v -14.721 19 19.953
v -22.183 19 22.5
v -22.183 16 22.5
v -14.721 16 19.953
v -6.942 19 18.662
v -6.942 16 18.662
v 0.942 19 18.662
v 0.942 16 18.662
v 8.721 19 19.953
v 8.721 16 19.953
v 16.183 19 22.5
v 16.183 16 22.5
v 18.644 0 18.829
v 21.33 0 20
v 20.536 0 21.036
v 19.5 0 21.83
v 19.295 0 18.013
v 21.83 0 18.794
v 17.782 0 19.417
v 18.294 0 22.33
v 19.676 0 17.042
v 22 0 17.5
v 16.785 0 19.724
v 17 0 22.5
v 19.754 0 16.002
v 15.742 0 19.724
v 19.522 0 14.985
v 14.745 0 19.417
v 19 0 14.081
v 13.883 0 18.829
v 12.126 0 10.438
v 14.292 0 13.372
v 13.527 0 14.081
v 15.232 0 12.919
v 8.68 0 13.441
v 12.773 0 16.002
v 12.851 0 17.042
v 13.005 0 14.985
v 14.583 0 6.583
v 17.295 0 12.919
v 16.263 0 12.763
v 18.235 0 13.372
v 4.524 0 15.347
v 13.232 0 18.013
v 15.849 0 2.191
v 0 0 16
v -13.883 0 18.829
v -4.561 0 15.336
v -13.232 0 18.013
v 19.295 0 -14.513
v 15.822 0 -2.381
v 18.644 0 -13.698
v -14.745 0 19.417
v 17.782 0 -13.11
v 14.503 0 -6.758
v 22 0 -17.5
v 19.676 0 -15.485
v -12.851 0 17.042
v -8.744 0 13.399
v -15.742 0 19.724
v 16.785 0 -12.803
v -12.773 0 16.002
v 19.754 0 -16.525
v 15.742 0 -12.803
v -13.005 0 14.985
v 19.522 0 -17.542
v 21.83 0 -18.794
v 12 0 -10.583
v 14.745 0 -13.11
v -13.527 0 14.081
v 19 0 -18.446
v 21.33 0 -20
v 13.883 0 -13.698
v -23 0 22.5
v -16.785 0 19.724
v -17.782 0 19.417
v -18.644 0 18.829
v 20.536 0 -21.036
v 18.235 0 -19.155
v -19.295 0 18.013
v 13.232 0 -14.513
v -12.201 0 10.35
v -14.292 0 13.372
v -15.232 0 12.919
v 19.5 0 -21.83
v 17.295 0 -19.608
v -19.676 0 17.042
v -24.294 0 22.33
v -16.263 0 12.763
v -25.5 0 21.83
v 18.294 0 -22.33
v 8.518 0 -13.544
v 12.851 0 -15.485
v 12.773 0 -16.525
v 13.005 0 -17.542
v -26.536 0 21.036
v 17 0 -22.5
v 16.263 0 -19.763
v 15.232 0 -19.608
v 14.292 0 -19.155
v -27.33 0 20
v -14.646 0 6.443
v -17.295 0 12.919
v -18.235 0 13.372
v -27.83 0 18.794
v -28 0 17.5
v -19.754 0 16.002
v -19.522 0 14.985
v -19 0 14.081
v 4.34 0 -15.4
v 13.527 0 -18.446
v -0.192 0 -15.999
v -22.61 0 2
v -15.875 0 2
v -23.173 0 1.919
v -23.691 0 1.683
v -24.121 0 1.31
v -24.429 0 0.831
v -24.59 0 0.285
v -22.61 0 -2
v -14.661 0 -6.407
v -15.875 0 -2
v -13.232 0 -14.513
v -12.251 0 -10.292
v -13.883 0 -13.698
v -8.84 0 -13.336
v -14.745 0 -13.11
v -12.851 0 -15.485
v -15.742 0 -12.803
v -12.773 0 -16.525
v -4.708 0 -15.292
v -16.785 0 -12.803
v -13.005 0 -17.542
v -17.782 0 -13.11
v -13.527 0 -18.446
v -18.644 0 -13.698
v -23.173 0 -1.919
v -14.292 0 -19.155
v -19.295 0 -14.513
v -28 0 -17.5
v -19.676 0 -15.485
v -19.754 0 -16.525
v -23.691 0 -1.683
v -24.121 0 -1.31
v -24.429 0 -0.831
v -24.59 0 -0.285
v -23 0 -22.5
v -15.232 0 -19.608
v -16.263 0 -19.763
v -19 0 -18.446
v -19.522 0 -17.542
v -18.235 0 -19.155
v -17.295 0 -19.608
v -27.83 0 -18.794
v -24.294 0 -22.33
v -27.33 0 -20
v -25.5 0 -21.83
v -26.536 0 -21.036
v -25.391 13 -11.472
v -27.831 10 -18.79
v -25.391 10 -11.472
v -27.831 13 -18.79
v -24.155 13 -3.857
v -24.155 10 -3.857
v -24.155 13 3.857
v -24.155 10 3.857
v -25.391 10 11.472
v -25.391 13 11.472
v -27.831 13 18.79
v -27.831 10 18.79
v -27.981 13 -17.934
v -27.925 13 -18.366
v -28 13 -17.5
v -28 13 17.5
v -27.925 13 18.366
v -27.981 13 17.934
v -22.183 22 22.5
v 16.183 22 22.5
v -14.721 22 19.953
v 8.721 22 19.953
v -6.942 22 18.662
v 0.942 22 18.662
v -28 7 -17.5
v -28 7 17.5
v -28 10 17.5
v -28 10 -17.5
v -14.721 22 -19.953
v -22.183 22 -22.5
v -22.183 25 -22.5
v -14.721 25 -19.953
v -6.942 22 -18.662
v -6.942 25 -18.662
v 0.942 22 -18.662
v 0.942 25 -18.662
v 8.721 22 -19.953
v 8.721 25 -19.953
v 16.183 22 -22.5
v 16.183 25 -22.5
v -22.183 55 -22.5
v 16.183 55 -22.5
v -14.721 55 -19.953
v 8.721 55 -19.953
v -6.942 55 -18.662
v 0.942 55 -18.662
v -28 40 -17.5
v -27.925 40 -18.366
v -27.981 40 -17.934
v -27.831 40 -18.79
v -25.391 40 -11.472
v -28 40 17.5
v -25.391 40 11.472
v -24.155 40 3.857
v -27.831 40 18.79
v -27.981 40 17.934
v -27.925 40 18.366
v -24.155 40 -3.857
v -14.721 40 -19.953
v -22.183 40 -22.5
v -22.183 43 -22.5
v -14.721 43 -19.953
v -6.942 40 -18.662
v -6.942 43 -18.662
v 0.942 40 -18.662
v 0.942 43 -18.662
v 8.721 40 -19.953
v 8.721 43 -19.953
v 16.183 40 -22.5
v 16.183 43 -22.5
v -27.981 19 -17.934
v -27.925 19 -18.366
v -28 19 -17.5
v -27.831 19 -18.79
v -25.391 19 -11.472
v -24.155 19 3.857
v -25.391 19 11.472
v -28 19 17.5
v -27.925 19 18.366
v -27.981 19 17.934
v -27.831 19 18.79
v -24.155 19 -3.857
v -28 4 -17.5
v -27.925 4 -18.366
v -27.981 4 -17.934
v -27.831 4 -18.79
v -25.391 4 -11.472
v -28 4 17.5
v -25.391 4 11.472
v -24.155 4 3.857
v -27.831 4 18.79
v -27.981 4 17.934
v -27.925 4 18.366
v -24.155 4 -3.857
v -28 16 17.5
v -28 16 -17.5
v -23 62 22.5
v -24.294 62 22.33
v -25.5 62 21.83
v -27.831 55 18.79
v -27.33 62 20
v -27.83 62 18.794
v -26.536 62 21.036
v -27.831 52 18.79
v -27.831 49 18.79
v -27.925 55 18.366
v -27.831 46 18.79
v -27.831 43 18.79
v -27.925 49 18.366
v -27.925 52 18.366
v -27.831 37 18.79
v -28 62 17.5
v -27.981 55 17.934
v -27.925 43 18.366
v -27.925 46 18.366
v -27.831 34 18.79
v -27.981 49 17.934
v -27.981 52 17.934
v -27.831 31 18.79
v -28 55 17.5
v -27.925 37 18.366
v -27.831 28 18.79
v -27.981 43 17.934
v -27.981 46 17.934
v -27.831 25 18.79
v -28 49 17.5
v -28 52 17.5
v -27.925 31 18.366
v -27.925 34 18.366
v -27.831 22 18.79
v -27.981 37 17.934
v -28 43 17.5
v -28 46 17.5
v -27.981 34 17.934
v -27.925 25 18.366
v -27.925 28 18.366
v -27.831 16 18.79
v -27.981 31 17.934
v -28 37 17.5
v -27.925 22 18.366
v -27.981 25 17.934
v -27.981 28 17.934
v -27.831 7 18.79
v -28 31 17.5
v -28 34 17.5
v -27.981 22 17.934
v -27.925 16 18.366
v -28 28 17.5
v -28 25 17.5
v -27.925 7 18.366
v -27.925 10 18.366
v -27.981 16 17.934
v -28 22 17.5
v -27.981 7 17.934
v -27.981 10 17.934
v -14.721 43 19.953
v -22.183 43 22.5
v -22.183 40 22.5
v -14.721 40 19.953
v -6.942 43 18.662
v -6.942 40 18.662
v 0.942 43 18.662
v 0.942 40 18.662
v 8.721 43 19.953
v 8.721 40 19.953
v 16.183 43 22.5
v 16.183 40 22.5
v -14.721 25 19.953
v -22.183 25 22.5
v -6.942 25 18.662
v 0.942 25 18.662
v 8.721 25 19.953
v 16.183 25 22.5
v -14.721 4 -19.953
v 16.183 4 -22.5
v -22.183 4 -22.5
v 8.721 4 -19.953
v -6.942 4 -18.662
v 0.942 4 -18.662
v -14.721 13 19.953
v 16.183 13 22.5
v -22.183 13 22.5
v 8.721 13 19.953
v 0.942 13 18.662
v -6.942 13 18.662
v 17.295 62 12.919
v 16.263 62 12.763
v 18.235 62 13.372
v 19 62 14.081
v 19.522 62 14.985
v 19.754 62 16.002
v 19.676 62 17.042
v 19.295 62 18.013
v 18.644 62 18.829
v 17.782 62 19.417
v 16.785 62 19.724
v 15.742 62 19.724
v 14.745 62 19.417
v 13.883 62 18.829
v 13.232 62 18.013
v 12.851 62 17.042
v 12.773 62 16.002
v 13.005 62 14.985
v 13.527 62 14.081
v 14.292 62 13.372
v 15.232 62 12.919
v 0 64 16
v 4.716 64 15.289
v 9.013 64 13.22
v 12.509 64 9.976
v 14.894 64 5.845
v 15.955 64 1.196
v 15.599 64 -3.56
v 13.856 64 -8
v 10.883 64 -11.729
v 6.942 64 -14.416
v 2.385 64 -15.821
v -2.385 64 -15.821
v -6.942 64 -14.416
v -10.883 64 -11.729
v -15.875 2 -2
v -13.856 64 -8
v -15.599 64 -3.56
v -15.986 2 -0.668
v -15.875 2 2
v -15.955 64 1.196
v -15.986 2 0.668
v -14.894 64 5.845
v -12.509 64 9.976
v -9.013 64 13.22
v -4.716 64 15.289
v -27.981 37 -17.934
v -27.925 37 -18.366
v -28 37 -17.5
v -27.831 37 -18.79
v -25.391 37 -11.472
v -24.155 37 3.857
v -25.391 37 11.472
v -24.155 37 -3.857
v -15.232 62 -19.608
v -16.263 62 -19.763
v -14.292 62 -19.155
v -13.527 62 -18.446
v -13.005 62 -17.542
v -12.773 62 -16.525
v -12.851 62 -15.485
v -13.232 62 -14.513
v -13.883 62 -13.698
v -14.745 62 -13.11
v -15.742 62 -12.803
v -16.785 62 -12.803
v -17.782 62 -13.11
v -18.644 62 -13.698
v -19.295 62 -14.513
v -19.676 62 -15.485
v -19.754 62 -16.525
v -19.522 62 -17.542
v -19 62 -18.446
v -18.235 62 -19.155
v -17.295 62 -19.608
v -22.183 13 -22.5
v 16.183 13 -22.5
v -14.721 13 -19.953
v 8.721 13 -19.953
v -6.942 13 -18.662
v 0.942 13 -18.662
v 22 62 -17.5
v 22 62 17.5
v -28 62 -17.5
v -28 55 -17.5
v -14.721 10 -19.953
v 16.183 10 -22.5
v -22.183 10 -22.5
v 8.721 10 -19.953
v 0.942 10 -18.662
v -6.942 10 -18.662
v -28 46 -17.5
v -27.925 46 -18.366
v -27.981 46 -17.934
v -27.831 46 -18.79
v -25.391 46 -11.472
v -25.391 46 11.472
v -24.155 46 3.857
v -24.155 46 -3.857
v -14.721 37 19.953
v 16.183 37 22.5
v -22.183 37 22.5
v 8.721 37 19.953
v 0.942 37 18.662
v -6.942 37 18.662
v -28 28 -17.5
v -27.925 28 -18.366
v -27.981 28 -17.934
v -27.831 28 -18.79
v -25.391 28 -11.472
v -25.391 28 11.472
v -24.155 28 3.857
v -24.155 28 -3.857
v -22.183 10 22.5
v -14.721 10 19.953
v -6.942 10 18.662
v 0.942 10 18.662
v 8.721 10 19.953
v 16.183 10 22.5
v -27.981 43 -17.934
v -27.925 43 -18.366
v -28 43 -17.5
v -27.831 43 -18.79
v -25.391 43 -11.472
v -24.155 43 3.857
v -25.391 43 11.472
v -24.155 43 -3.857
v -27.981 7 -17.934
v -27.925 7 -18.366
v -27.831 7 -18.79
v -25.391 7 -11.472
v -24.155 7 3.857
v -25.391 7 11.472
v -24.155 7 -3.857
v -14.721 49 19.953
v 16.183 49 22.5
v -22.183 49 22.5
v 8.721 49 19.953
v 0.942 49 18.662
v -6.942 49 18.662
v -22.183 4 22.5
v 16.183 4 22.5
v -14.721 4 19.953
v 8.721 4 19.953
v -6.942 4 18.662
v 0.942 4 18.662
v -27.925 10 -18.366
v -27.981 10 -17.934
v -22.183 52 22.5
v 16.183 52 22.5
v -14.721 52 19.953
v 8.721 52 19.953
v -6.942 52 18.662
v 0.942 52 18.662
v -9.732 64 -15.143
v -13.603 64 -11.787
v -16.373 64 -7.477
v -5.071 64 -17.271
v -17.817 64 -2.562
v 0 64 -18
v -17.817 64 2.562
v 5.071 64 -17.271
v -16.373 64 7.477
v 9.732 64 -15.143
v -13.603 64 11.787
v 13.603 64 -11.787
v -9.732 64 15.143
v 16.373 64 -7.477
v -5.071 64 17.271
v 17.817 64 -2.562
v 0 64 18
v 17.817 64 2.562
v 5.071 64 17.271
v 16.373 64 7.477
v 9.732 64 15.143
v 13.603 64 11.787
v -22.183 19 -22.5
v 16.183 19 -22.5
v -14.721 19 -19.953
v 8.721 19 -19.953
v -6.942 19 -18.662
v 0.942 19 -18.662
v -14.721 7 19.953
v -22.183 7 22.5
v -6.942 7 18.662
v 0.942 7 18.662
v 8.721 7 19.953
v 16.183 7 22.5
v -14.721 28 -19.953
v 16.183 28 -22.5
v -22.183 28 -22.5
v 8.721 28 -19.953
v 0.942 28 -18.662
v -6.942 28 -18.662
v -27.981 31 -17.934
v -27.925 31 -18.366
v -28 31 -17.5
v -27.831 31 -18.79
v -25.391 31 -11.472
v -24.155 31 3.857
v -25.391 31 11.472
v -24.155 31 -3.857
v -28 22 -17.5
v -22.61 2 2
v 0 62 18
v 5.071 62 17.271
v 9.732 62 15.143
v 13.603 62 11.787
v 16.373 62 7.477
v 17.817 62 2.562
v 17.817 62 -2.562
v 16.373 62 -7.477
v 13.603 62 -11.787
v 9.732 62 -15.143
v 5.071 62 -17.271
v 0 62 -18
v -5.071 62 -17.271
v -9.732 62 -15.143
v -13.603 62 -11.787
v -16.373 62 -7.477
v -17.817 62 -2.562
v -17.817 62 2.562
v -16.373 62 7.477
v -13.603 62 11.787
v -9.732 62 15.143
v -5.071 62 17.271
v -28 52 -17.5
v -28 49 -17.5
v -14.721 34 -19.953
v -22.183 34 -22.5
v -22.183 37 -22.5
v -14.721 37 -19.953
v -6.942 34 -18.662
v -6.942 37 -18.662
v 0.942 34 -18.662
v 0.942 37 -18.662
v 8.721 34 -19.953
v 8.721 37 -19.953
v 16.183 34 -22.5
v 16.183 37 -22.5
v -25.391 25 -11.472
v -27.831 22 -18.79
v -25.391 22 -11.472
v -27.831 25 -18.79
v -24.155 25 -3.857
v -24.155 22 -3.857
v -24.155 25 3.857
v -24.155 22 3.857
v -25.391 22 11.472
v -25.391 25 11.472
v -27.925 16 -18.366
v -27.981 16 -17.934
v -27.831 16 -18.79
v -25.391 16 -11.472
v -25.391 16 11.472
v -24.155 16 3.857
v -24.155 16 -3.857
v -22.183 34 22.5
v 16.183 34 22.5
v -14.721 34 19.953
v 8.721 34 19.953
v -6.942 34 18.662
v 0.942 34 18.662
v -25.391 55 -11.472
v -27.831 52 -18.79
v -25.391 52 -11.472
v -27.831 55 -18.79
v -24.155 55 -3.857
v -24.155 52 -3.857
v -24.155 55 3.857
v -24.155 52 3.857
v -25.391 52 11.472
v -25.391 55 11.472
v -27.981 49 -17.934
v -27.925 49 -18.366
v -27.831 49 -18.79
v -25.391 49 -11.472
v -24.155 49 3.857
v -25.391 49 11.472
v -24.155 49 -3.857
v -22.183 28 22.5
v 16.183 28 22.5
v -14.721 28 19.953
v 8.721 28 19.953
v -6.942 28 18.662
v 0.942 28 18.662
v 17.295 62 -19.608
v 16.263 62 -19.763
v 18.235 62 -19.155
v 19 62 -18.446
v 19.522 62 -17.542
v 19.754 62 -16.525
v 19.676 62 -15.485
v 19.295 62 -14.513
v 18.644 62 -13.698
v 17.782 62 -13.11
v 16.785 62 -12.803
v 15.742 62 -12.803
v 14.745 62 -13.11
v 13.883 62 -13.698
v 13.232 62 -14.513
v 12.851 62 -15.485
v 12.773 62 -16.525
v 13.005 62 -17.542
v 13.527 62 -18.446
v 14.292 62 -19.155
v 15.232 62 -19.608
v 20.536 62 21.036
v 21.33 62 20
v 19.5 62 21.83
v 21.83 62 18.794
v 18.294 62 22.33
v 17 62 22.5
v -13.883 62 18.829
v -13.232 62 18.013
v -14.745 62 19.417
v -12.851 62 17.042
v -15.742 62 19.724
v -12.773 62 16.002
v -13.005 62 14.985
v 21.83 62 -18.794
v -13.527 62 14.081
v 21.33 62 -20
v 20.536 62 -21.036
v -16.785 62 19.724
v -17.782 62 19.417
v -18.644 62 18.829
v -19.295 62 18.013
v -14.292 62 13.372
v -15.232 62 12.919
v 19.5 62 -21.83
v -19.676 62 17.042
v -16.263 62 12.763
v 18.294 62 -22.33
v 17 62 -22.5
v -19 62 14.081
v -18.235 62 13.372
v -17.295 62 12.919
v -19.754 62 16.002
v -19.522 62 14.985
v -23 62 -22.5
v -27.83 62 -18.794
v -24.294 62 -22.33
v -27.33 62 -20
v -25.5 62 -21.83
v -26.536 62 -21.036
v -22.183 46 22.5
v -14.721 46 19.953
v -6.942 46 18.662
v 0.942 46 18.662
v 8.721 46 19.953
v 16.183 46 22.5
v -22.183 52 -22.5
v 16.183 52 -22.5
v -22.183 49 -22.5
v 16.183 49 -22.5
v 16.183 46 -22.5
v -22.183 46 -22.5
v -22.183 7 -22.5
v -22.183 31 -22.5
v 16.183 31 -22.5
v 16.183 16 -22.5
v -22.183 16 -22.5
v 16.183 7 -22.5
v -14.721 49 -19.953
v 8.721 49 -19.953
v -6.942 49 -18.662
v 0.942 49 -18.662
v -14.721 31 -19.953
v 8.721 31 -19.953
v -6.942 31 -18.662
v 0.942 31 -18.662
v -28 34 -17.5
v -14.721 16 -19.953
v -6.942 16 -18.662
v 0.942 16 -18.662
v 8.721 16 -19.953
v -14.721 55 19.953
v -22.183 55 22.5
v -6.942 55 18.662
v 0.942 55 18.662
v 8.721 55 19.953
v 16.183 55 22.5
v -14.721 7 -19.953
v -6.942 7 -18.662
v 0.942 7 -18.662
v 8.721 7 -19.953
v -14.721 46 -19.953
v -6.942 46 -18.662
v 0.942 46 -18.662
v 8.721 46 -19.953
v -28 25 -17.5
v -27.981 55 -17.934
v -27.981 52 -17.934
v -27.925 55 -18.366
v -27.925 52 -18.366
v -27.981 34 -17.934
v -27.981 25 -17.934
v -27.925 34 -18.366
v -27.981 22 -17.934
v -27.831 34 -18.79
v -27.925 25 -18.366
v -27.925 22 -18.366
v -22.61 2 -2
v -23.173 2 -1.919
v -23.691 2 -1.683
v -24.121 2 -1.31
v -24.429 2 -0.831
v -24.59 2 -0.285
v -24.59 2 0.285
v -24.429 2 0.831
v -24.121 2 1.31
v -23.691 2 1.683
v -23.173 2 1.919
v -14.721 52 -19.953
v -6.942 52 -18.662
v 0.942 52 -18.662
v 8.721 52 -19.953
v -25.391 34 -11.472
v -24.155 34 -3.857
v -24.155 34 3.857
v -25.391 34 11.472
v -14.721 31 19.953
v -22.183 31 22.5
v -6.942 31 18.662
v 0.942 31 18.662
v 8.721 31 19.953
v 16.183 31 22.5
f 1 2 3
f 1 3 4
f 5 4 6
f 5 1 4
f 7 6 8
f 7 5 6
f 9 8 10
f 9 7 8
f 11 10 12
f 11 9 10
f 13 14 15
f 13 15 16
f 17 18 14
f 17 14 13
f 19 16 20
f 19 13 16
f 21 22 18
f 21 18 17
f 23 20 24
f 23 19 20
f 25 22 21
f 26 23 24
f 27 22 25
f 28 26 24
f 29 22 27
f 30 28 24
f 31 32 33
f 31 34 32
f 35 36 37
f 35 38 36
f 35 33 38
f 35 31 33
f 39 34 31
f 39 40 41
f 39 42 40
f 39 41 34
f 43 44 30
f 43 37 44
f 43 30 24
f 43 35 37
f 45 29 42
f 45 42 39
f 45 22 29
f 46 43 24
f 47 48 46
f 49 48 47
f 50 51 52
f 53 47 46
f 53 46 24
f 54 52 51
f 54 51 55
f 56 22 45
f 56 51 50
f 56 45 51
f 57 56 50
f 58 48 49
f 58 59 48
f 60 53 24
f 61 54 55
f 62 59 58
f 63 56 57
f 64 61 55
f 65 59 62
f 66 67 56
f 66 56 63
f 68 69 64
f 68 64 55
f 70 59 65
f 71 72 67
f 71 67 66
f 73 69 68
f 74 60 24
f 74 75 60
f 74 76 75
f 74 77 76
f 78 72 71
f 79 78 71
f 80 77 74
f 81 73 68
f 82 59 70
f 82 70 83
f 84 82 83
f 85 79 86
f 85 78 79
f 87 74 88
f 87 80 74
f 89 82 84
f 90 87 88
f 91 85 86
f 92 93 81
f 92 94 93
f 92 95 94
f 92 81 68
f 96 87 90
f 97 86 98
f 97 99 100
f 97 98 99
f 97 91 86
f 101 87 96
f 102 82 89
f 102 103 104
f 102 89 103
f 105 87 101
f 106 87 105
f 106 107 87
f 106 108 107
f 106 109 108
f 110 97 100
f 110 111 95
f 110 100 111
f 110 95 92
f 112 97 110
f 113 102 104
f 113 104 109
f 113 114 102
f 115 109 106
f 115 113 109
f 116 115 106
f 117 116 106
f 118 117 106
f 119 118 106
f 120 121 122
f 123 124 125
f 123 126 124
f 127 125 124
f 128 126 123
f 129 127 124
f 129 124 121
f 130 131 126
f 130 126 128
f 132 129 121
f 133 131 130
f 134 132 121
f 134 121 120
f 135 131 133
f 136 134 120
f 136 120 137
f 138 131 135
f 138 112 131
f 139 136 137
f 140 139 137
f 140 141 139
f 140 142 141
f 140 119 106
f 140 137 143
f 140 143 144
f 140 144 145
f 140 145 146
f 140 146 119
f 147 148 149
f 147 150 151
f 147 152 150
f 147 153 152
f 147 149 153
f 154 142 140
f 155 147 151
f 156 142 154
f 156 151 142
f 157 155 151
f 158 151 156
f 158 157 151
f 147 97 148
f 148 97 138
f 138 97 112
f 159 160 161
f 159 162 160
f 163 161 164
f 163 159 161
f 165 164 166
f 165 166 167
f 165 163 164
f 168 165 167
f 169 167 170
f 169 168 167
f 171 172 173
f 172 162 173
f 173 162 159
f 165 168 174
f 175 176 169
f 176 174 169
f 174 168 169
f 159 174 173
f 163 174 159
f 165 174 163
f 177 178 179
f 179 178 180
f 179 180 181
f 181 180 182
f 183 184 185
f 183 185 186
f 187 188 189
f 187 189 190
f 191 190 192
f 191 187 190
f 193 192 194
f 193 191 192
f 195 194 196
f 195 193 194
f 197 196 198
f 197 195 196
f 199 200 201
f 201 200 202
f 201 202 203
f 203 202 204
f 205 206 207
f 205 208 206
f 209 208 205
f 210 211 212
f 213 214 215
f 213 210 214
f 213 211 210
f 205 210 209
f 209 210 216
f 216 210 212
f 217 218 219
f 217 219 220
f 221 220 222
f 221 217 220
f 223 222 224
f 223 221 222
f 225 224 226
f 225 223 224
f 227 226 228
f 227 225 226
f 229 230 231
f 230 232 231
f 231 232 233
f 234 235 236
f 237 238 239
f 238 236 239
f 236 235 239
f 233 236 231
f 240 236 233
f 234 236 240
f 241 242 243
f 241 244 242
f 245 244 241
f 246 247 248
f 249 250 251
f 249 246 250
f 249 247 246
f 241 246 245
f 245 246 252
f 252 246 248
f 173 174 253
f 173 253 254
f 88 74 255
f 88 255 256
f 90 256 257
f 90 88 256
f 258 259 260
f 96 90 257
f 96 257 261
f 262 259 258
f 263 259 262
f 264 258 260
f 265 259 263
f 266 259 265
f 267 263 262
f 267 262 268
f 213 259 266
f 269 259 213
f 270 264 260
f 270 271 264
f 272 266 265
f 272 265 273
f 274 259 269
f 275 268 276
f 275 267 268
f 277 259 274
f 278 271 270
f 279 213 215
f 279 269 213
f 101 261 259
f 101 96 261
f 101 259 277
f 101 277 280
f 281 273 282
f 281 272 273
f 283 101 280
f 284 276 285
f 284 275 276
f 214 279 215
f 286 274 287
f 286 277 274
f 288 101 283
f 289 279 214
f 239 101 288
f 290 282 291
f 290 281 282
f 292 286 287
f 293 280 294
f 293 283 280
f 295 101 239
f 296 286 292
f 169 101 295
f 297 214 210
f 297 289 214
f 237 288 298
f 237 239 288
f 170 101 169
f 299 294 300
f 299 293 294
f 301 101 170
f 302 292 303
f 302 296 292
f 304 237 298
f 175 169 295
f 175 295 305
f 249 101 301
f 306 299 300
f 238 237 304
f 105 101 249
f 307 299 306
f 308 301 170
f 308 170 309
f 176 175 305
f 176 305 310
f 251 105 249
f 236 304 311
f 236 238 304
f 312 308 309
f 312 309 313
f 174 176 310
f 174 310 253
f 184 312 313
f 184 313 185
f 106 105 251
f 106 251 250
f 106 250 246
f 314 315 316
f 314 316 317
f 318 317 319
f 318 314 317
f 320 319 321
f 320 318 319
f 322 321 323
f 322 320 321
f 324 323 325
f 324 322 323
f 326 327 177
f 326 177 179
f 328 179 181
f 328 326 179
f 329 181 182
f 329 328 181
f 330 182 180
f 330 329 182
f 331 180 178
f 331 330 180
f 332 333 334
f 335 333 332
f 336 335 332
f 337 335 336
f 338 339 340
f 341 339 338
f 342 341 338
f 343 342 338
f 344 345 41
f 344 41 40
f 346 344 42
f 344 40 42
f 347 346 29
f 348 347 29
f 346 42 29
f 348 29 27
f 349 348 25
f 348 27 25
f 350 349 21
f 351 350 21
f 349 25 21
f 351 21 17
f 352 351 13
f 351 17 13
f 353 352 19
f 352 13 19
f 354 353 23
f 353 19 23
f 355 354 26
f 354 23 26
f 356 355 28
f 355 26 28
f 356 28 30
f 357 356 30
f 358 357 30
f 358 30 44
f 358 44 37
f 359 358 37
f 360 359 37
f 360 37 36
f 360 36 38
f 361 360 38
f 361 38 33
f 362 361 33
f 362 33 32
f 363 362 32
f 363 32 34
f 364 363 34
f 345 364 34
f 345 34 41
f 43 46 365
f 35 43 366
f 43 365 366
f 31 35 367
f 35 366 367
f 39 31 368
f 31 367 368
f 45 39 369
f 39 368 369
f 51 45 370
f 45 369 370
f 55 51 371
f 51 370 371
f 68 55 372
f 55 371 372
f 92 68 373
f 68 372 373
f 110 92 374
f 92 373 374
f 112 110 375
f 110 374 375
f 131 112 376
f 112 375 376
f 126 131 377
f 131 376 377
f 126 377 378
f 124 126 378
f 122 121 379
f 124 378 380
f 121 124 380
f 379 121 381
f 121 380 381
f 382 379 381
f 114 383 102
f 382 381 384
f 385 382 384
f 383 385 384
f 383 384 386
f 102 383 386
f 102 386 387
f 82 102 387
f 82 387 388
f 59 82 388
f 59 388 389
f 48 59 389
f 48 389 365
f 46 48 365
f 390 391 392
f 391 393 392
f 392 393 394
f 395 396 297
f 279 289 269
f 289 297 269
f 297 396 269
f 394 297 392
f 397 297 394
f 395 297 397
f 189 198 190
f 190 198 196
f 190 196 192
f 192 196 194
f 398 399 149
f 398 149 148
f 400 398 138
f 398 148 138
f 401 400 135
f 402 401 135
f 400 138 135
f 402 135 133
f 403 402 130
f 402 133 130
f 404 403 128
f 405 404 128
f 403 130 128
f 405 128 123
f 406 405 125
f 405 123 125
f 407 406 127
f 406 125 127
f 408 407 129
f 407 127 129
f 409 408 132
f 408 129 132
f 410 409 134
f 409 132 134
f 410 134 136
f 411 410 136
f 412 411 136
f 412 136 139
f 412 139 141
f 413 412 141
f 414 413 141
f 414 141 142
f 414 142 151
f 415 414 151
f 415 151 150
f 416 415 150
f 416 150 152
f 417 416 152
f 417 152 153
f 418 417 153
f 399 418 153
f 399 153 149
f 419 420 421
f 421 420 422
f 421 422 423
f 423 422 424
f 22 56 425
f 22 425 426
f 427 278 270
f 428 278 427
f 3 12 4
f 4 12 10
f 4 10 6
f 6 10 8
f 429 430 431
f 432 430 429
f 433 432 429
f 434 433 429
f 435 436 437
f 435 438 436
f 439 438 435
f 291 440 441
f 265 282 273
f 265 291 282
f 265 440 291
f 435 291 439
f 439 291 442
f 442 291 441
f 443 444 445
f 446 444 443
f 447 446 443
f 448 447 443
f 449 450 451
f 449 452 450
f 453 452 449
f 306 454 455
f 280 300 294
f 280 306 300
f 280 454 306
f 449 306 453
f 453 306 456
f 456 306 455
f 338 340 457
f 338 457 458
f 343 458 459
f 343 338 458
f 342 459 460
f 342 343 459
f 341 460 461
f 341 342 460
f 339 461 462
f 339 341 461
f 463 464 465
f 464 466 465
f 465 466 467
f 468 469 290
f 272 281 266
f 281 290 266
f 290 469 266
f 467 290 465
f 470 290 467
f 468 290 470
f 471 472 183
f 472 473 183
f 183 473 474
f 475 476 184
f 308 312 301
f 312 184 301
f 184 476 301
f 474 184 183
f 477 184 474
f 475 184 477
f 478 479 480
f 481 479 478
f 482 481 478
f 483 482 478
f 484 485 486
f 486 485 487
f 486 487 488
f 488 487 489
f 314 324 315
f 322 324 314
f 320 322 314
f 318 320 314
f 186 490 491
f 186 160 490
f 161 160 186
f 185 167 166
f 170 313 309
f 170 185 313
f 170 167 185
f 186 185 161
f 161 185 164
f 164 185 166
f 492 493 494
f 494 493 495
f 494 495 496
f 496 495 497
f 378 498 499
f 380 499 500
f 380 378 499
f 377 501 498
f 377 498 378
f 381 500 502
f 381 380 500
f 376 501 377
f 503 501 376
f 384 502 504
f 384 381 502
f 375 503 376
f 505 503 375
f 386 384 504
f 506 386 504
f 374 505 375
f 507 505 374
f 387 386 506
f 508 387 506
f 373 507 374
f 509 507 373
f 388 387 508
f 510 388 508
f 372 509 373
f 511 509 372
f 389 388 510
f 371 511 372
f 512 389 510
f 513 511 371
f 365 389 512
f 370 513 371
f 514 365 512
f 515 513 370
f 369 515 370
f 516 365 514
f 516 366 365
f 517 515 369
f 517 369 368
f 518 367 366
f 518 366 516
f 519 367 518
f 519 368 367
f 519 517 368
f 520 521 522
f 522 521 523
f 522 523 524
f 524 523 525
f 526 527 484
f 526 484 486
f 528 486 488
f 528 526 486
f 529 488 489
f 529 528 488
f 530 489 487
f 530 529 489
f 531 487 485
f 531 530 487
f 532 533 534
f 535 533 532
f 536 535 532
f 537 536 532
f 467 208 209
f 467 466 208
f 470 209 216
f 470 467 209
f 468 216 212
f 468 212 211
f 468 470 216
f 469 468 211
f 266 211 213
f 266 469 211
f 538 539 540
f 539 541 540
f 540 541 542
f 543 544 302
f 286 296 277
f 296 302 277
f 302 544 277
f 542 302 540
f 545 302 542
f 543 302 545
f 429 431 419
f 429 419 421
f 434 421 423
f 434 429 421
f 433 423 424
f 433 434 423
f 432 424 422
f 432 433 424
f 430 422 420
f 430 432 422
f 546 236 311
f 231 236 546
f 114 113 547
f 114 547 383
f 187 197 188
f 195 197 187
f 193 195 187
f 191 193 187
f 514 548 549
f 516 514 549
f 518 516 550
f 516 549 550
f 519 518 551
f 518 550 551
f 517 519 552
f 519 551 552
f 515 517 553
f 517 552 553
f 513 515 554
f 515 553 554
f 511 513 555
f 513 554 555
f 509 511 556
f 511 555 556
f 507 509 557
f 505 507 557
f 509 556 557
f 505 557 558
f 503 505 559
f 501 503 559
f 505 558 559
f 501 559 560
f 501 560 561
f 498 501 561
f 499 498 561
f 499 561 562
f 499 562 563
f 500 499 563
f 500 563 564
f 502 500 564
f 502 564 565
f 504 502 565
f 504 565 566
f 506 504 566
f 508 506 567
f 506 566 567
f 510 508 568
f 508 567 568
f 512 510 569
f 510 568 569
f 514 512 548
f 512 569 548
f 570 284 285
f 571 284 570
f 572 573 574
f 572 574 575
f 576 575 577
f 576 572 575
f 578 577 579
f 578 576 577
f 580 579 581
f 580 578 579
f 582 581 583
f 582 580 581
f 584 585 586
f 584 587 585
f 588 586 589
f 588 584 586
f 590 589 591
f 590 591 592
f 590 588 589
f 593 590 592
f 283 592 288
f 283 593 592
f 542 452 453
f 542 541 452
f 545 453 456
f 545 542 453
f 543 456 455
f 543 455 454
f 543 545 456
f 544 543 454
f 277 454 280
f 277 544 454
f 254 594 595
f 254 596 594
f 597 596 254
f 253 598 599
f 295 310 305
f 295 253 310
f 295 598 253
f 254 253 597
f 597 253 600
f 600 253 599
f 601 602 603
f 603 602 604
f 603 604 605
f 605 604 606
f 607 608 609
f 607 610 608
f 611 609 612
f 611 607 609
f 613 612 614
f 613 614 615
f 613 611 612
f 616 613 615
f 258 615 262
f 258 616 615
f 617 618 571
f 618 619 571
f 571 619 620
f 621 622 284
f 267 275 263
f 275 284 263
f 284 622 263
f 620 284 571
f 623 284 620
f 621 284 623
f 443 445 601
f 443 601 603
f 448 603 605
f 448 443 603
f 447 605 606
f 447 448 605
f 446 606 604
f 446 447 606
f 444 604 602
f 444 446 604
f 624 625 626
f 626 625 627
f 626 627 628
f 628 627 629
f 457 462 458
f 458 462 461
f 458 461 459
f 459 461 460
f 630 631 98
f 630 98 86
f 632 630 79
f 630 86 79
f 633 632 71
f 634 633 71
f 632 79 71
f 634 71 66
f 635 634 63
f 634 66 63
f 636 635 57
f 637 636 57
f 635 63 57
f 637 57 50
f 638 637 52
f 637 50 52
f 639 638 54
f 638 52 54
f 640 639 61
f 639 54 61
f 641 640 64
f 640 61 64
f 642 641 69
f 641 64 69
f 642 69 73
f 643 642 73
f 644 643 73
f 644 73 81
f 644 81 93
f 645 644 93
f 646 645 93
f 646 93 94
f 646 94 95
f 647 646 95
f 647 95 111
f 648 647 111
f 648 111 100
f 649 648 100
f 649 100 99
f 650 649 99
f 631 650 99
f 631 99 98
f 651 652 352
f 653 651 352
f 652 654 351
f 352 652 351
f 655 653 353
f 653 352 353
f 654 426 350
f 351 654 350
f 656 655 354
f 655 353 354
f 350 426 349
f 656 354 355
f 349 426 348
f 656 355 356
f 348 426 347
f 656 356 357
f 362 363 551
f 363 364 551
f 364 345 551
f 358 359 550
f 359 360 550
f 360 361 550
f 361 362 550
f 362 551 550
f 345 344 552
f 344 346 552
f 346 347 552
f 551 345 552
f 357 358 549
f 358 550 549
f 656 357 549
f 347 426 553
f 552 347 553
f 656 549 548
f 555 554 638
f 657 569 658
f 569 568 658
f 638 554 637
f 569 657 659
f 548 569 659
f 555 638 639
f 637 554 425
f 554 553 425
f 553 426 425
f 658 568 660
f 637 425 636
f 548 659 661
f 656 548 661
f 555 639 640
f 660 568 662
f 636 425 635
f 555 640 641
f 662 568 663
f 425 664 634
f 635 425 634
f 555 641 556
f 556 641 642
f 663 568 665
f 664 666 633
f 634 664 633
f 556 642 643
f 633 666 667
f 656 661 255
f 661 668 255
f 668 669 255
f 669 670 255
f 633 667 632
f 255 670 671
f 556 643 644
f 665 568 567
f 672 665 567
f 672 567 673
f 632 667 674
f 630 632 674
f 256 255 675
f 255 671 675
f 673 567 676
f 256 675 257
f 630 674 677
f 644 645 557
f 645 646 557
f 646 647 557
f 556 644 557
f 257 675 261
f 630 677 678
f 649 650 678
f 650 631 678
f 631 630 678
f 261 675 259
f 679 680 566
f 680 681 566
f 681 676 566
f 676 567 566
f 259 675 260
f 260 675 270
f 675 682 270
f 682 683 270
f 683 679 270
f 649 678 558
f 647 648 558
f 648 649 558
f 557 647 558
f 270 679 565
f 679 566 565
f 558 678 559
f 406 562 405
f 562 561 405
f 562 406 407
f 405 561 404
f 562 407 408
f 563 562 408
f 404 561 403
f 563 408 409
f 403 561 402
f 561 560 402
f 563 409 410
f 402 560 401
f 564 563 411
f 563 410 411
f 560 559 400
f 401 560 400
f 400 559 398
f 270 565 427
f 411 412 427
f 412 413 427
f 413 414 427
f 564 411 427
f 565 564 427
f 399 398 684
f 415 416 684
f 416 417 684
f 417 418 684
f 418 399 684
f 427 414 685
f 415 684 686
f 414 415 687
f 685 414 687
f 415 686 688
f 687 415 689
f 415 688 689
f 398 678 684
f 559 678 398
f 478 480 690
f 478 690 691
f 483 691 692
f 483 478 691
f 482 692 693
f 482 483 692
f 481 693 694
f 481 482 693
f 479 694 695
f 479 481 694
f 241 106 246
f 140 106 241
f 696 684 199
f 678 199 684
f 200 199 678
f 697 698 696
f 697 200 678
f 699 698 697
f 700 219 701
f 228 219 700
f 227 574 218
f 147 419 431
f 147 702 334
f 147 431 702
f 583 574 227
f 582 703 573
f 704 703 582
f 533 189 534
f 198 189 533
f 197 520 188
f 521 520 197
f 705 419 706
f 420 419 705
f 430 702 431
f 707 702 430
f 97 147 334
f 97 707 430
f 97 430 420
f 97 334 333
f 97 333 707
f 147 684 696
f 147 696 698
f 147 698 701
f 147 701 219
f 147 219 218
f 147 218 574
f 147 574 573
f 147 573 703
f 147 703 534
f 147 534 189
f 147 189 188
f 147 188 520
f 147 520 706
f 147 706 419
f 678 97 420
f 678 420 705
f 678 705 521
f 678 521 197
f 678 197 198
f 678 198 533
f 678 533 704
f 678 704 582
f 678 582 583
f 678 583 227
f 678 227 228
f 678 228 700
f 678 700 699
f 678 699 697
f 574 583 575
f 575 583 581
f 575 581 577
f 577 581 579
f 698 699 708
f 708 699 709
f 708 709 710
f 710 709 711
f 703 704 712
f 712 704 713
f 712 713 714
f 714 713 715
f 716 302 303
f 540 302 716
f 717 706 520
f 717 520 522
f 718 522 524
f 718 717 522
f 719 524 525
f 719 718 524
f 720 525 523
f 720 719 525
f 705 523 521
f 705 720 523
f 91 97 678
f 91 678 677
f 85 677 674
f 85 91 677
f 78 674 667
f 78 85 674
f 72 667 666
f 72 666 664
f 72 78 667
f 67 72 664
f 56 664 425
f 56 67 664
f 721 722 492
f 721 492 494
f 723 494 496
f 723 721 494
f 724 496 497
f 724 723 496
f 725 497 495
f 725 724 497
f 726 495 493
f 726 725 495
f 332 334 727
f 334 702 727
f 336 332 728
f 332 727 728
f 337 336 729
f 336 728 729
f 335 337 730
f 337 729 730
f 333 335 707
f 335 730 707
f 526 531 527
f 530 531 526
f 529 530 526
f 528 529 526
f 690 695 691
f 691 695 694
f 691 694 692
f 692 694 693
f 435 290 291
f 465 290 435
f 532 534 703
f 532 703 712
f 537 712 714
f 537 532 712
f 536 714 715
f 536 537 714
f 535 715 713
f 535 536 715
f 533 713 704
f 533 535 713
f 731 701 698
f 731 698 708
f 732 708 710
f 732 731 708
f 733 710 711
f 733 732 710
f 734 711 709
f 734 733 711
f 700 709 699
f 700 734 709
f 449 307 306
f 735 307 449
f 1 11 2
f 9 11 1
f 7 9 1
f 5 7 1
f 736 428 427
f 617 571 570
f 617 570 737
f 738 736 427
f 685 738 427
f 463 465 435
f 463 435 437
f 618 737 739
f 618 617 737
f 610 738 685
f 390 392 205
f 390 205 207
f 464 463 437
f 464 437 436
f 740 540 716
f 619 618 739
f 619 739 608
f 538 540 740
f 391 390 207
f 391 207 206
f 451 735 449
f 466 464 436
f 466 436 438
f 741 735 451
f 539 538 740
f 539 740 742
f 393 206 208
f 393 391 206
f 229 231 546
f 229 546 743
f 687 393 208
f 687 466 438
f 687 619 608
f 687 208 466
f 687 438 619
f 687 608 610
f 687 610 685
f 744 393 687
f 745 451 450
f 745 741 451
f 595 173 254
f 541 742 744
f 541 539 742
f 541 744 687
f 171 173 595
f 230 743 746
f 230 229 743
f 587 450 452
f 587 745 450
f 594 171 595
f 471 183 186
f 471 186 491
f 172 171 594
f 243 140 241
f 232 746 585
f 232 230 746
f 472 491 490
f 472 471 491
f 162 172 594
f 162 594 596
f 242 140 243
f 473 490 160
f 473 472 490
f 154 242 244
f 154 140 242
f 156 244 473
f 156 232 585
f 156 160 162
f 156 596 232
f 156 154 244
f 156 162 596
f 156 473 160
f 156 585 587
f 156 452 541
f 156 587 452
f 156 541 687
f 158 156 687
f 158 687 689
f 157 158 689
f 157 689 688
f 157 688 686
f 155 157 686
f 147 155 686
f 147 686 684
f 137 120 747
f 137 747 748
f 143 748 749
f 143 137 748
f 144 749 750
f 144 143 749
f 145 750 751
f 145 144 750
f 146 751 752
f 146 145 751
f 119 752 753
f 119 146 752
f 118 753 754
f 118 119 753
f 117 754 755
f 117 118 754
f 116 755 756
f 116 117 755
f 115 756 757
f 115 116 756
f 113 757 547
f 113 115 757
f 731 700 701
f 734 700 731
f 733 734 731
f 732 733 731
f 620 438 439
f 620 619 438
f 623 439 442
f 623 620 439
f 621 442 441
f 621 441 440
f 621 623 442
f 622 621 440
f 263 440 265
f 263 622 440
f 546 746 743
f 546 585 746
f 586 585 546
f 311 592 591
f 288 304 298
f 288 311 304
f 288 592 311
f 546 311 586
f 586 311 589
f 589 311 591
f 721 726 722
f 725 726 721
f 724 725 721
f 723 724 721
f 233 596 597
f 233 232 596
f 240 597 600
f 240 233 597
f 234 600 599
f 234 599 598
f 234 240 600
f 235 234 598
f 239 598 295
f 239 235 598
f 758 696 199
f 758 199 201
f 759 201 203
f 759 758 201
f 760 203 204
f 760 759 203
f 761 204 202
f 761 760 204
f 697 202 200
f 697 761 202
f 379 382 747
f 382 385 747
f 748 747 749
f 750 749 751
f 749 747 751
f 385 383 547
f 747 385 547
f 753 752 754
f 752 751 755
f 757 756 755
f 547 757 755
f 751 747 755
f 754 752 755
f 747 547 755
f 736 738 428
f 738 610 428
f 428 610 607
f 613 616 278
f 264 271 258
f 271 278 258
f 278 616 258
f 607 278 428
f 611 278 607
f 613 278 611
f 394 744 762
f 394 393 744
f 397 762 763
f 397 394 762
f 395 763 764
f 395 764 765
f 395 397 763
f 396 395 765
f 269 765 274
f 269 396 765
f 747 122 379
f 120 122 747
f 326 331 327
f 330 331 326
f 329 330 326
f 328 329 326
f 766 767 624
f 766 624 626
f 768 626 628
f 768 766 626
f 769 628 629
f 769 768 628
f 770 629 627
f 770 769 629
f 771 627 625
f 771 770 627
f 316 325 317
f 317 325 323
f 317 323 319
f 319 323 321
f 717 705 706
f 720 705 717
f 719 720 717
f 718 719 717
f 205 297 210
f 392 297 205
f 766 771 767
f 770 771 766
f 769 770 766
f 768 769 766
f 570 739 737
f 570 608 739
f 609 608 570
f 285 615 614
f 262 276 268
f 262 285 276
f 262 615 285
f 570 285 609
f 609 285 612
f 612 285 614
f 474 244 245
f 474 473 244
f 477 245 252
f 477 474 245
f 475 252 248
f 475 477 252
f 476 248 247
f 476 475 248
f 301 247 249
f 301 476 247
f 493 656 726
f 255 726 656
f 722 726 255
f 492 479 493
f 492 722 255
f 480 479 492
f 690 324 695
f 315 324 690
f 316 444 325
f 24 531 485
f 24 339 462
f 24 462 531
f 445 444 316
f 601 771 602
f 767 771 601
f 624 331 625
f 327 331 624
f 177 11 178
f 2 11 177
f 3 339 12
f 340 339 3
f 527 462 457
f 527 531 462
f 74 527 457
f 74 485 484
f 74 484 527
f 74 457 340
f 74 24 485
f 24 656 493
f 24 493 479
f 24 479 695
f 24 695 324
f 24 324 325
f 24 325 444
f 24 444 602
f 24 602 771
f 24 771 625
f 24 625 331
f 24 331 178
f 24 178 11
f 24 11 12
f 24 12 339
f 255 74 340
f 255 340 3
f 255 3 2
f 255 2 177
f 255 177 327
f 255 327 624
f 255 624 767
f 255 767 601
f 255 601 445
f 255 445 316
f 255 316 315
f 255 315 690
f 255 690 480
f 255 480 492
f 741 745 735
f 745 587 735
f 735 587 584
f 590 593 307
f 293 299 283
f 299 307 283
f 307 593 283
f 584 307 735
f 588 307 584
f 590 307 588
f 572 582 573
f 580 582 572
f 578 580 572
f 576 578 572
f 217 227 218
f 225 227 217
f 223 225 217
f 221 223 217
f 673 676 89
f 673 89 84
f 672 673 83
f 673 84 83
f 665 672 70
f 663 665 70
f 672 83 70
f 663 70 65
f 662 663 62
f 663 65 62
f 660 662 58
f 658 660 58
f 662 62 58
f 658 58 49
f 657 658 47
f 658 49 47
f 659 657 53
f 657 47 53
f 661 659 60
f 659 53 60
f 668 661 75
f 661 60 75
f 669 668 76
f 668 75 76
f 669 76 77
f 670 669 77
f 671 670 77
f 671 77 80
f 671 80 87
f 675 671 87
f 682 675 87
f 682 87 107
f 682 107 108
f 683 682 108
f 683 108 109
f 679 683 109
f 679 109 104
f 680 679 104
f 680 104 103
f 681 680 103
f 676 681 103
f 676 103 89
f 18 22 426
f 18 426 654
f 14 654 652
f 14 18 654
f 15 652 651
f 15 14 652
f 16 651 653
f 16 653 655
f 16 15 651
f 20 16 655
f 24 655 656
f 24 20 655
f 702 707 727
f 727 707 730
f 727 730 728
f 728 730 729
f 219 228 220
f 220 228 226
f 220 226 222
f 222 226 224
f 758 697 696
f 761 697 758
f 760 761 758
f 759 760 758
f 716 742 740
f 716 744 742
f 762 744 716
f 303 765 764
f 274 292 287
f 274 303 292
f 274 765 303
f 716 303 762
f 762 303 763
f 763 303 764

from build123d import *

# Parameters (mm, degrees)
BOSS_EXTRUDE1_DEPTH     = 62
SKETCH2_R               = 18
BOSS_EXTRUDE2_DEPTH     = 2
SKETCH3_R               = 16
CUT_EXTRUDE1_DEPTH      = 74.391075752
CUT_EXTRUDE2_DEPTH      = 2
SKETCH5_R               = 3.5
CUT_EXTRUDE3_DEPTH      = 74.391075752
SKETCH6_W               = 48
SKETCH6_H               = 3
LPATTERN1_COUNT         = 9
LPATTERN1_PITCH         = 6
MIRROR1_COPY_1_SKETCH_W = 48
MIRROR1_COPY_1_SKETCH_H = 3
MIRROR1_COPY_2_SKETCH_W = 48
MIRROR1_COPY_2_SKETCH_H = 3
MIRROR1_COPY_3_SKETCH_W = 48
MIRROR1_COPY_3_SKETCH_H = 3
MIRROR1_COPY_4_SKETCH_W = 48
MIRROR1_COPY_4_SKETCH_H = 3
MIRROR1_COPY_5_SKETCH_W = 48
MIRROR1_COPY_5_SKETCH_H = 3
MIRROR1_COPY_6_SKETCH_W = 48
MIRROR1_COPY_6_SKETCH_H = 3
MIRROR1_COPY_7_SKETCH_W = 48
MIRROR1_COPY_7_SKETCH_H = 3
MIRROR1_COPY_8_SKETCH_W = 48
MIRROR1_COPY_8_SKETCH_H = 3
SKETCH8_W               = 48
SKETCH8_H               = 3
LPATTERN2_COUNT         = 9
LPATTERN2_PITCH         = 6


with BuildPart() as part:
    # Sketch1 → Boss-Extrude1 (new body)
    with BuildSketch(Plane(origin=(0, 0, 0), x_dir=(1, 0, 0), z_dir=(0, 1, 0))):
        with BuildLine():
            Line((-23, 22.5), (17, 22.5))
            ThreePointArc((17, 22.5), (20.535533906, 21.035533906), (22, 17.5))
            Line((22, 17.5), (22, -17.5))
            ThreePointArc((22, -17.5), (20.535533906, -21.035533906), (17, -22.5))
            Line((17, -22.5), (-23, -22.5))
            ThreePointArc((-23, -22.5), (-26.535533906, -21.035533906), (-28, -17.5))
            Line((-28, -17.5), (-28, 17.5))
            ThreePointArc((-28, 17.5), (-26.535533906, 21.035533906), (-23, 22.5))
        make_face()
    extrude(amount=BOSS_EXTRUDE1_DEPTH)

    # Sketch2 → Boss-Extrude2 (add)
    with BuildSketch(Plane(origin=(0, 62, 0), x_dir=(1, 0, 0), z_dir=(0, 1, 0))):
        with Locations(Location((0, 0, 0), (0, 0, 270))):
            Circle(SKETCH2_R)
    extrude(amount=BOSS_EXTRUDE2_DEPTH)

    # Sketch3 → Cut-Extrude1 (cut, through all)
    with BuildSketch(Plane(origin=(0, 64, 0), x_dir=(1, 0, 0), z_dir=(0, 1, 0))):
        with Locations(Location((0, 0, 0), (0, 0, 270))):
            Circle(SKETCH3_R)
    extrude(amount=-CUT_EXTRUDE1_DEPTH, mode=Mode.SUBTRACT)

    # Sketch4 → Cut-Extrude2 (cut)
    with BuildSketch(Plane.XZ):
        with BuildLine():
            Line((-22.61, 2), (-8.699965398, 2))
            Line((-8.699965398, 2), (-8.699965398, -2))
            Line((-8.699965398, -2), (-22.61, -2))
            ThreePointArc((-22.61, -2), (-24.61, 0), (-22.61, 2))
        make_face()
    extrude(amount=-CUT_EXTRUDE2_DEPTH, mode=Mode.SUBTRACT)

    # Sketch5 → Cut-Extrude3 (cut, through all)
    with BuildSketch(Plane.XZ):
        with Locations(Location((16.263455967, 16.263455967, 0), (0, 0, 270))):
            Circle(SKETCH5_R)
        with Locations(Location((16.263455967, -16.263455967, 0), (0, 0, 270))):
            Circle(SKETCH5_R)
        with Locations(Location((-16.263455967, -16.263455967, 0), (0, 0, 270))):
            Circle(SKETCH5_R)
        with Locations(Location((-16.263455967, 16.263455967, 0), (0, 0, 270))):
            Circle(SKETCH5_R)
    extrude(amount=-CUT_EXTRUDE3_DEPTH, mode=Mode.SUBTRACT)

    # Sketch6 → Cut-Revolve1 (revolve, cut)
    with BuildSketch(Plane(origin=(-3, 0, 0), x_dir=(0, 0, -1), z_dir=(1, 0, 0))):
        with Locations((-42.5, 5.5)):
            Rectangle(SKETCH6_W, SKETCH6_H)
    cut_revolve1 = revolve(axis=Axis((-3, 7, 66.5), (0, -1, 0)), mode=Mode.SUBTRACT)

    # LPattern1: Cut-Revolve1 ×9
    with Locations(*[(0, i * LPATTERN1_PITCH, 0) for i in range(1, LPATTERN1_COUNT)]):
        add(cut_revolve1, mode=Mode.SUBTRACT)

    # Mirror1: Cut-Revolve1 across plane
    add(cut_revolve1.mirror(Plane.XY), mode=Mode.SUBTRACT)

    # Mirror1 copy 1 sketch → Mirror1 copy 1 (revolve, cut)
    with BuildSketch(Plane(origin=(-3, 6, 0), x_dir=(0, 0, 1), z_dir=(1, 0, 0))):
        with Locations((-42.5, -5.5)):
            Rectangle(MIRROR1_COPY_1_SKETCH_W, MIRROR1_COPY_1_SKETCH_H)
    revolve(axis=Axis((-3, 13, -66.5), (0, 1, 0)), mode=Mode.SUBTRACT)

    # Mirror1 copy 2 sketch → Mirror1 copy 2 (revolve, cut)
    with BuildSketch(Plane(origin=(-3, 12, 0), x_dir=(0, 0, 1), z_dir=(1, 0, 0))):
        with Locations((-42.5, -5.5)):
            Rectangle(MIRROR1_COPY_2_SKETCH_W, MIRROR1_COPY_2_SKETCH_H)
    revolve(axis=Axis((-3, 19, -66.5), (0, 1, 0)), mode=Mode.SUBTRACT)

    # Mirror1 copy 3 sketch → Mirror1 copy 3 (revolve, cut)
    with BuildSketch(Plane(origin=(-3, 18, 0), x_dir=(0, 0, 1), z_dir=(1, 0, 0))):
        with Locations((-42.5, -5.5)):
            Rectangle(MIRROR1_COPY_3_SKETCH_W, MIRROR1_COPY_3_SKETCH_H)
    revolve(axis=Axis((-3, 25, -66.5), (0, 1, 0)), mode=Mode.SUBTRACT)

    # Mirror1 copy 4 sketch → Mirror1 copy 4 (revolve, cut)
    with BuildSketch(Plane(origin=(-3, 24, 0), x_dir=(0, 0, 1), z_dir=(1, 0, 0))):
        with Locations((-42.5, -5.5)):
            Rectangle(MIRROR1_COPY_4_SKETCH_W, MIRROR1_COPY_4_SKETCH_H)
    revolve(axis=Axis((-3, 31, -66.5), (0, 1, 0)), mode=Mode.SUBTRACT)

    # Mirror1 copy 5 sketch → Mirror1 copy 5 (revolve, cut)
    with BuildSketch(Plane(origin=(-3, 30, 0), x_dir=(0, 0, 1), z_dir=(1, 0, 0))):
        with Locations((-42.5, -5.5)):
            Rectangle(MIRROR1_COPY_5_SKETCH_W, MIRROR1_COPY_5_SKETCH_H)
    revolve(axis=Axis((-3, 37, -66.5), (0, 1, 0)), mode=Mode.SUBTRACT)

    # Mirror1 copy 6 sketch → Mirror1 copy 6 (revolve, cut)
    with BuildSketch(Plane(origin=(-3, 36, 0), x_dir=(0, 0, 1), z_dir=(1, 0, 0))):
        with Locations((-42.5, -5.5)):
            Rectangle(MIRROR1_COPY_6_SKETCH_W, MIRROR1_COPY_6_SKETCH_H)
    revolve(axis=Axis((-3, 43, -66.5), (0, 1, 0)), mode=Mode.SUBTRACT)

    # Mirror1 copy 7 sketch → Mirror1 copy 7 (revolve, cut)
    with BuildSketch(Plane(origin=(-3, 42, 0), x_dir=(0, 0, 1), z_dir=(1, 0, 0))):
        with Locations((-42.5, -5.5)):
            Rectangle(MIRROR1_COPY_7_SKETCH_W, MIRROR1_COPY_7_SKETCH_H)
    revolve(axis=Axis((-3, 49, -66.5), (0, 1, 0)), mode=Mode.SUBTRACT)

    # Mirror1 copy 8 sketch → Mirror1 copy 8 (revolve, cut)
    with BuildSketch(Plane(origin=(-3, 48, 0), x_dir=(0, 0, 1), z_dir=(1, 0, 0))):
        with Locations((-42.5, -5.5)):
            Rectangle(MIRROR1_COPY_8_SKETCH_W, MIRROR1_COPY_8_SKETCH_H)
    revolve(axis=Axis((-3, 55, -66.5), (0, 1, 0)), mode=Mode.SUBTRACT)

    # Sketch8 → Cut-Revolve3 (revolve, cut)
    with BuildSketch(Plane.XY):
        with Locations((-48, 5.5)):
            Rectangle(SKETCH8_W, SKETCH8_H)
    cut_revolve3 = revolve(axis=Axis((-72, 7, 0), (0, -1, 0)), mode=Mode.SUBTRACT)

    # LPattern2: Cut-Revolve3 ×9
    with Locations(*[(0, i * LPATTERN2_PITCH, 0) for i in range(1, LPATTERN2_COUNT)]):
        add(cut_revolve3, mode=Mode.SUBTRACT)


solid = part.part
